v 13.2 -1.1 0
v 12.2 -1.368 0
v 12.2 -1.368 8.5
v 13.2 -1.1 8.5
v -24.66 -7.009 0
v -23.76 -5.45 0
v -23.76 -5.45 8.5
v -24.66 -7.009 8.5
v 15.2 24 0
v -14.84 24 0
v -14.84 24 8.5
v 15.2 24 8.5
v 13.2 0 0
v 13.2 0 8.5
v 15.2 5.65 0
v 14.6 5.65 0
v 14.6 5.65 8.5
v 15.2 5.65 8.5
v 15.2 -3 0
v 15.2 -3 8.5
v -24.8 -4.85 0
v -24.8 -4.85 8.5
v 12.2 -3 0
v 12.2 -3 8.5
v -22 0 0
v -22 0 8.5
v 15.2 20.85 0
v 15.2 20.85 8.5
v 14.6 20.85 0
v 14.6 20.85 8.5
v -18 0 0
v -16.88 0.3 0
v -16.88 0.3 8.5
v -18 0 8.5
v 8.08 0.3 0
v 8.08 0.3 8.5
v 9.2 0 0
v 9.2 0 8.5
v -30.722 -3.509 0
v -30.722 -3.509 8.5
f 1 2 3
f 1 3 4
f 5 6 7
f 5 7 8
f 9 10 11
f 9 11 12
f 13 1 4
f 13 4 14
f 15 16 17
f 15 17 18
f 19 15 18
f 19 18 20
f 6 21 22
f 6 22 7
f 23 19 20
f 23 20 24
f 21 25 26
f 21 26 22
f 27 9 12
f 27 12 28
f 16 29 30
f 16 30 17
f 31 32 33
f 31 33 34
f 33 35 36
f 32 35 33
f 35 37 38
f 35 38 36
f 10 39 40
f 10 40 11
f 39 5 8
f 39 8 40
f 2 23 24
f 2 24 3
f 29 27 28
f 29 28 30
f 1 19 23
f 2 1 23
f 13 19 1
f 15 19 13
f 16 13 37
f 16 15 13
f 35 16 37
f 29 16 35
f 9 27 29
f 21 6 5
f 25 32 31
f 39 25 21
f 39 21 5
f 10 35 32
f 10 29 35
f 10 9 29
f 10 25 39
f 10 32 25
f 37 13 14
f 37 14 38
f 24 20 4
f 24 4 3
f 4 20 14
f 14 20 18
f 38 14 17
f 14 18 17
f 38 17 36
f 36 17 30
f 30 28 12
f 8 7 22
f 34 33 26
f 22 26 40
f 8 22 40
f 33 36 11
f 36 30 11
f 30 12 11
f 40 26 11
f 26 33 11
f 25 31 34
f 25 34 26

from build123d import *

# Parameters (mm, degrees)
DODANIE_WYCI_GNI_CIE1_DEPTH = 8.5


with BuildPart() as part:
    # Szkic1 → Dodanie-wyciągnięcie1 (new body)
    with BuildSketch(Plane(origin=(0, 0, 0), x_dir=(-1, 0, 0), z_dir=(0, 0, -1))):
        Polygon((-8.080384758, 0.3), (16.880384758, 0.3), (18, 0), (22, 0), (24.8, -4.849742261), (23.759936491, -5.450223208), (24.659936491, -7.009068935), (30.722114317, -3.509068935), (14.839745962, 24), (-15.2, 24), (-15.2, 20.85), (-14.6, 20.85), (-14.6, 5.65), (-15.2, 5.65), (-15.2, -3), (-12.2, -3), (-12.2, -1.367949192), (-13.2, -1.1), (-13.2, 0), (-9.2, 0), align=None)
    extrude(amount=-DODANIE_WYCI_GNI_CIE1_DEPTH)


solid = part.part
